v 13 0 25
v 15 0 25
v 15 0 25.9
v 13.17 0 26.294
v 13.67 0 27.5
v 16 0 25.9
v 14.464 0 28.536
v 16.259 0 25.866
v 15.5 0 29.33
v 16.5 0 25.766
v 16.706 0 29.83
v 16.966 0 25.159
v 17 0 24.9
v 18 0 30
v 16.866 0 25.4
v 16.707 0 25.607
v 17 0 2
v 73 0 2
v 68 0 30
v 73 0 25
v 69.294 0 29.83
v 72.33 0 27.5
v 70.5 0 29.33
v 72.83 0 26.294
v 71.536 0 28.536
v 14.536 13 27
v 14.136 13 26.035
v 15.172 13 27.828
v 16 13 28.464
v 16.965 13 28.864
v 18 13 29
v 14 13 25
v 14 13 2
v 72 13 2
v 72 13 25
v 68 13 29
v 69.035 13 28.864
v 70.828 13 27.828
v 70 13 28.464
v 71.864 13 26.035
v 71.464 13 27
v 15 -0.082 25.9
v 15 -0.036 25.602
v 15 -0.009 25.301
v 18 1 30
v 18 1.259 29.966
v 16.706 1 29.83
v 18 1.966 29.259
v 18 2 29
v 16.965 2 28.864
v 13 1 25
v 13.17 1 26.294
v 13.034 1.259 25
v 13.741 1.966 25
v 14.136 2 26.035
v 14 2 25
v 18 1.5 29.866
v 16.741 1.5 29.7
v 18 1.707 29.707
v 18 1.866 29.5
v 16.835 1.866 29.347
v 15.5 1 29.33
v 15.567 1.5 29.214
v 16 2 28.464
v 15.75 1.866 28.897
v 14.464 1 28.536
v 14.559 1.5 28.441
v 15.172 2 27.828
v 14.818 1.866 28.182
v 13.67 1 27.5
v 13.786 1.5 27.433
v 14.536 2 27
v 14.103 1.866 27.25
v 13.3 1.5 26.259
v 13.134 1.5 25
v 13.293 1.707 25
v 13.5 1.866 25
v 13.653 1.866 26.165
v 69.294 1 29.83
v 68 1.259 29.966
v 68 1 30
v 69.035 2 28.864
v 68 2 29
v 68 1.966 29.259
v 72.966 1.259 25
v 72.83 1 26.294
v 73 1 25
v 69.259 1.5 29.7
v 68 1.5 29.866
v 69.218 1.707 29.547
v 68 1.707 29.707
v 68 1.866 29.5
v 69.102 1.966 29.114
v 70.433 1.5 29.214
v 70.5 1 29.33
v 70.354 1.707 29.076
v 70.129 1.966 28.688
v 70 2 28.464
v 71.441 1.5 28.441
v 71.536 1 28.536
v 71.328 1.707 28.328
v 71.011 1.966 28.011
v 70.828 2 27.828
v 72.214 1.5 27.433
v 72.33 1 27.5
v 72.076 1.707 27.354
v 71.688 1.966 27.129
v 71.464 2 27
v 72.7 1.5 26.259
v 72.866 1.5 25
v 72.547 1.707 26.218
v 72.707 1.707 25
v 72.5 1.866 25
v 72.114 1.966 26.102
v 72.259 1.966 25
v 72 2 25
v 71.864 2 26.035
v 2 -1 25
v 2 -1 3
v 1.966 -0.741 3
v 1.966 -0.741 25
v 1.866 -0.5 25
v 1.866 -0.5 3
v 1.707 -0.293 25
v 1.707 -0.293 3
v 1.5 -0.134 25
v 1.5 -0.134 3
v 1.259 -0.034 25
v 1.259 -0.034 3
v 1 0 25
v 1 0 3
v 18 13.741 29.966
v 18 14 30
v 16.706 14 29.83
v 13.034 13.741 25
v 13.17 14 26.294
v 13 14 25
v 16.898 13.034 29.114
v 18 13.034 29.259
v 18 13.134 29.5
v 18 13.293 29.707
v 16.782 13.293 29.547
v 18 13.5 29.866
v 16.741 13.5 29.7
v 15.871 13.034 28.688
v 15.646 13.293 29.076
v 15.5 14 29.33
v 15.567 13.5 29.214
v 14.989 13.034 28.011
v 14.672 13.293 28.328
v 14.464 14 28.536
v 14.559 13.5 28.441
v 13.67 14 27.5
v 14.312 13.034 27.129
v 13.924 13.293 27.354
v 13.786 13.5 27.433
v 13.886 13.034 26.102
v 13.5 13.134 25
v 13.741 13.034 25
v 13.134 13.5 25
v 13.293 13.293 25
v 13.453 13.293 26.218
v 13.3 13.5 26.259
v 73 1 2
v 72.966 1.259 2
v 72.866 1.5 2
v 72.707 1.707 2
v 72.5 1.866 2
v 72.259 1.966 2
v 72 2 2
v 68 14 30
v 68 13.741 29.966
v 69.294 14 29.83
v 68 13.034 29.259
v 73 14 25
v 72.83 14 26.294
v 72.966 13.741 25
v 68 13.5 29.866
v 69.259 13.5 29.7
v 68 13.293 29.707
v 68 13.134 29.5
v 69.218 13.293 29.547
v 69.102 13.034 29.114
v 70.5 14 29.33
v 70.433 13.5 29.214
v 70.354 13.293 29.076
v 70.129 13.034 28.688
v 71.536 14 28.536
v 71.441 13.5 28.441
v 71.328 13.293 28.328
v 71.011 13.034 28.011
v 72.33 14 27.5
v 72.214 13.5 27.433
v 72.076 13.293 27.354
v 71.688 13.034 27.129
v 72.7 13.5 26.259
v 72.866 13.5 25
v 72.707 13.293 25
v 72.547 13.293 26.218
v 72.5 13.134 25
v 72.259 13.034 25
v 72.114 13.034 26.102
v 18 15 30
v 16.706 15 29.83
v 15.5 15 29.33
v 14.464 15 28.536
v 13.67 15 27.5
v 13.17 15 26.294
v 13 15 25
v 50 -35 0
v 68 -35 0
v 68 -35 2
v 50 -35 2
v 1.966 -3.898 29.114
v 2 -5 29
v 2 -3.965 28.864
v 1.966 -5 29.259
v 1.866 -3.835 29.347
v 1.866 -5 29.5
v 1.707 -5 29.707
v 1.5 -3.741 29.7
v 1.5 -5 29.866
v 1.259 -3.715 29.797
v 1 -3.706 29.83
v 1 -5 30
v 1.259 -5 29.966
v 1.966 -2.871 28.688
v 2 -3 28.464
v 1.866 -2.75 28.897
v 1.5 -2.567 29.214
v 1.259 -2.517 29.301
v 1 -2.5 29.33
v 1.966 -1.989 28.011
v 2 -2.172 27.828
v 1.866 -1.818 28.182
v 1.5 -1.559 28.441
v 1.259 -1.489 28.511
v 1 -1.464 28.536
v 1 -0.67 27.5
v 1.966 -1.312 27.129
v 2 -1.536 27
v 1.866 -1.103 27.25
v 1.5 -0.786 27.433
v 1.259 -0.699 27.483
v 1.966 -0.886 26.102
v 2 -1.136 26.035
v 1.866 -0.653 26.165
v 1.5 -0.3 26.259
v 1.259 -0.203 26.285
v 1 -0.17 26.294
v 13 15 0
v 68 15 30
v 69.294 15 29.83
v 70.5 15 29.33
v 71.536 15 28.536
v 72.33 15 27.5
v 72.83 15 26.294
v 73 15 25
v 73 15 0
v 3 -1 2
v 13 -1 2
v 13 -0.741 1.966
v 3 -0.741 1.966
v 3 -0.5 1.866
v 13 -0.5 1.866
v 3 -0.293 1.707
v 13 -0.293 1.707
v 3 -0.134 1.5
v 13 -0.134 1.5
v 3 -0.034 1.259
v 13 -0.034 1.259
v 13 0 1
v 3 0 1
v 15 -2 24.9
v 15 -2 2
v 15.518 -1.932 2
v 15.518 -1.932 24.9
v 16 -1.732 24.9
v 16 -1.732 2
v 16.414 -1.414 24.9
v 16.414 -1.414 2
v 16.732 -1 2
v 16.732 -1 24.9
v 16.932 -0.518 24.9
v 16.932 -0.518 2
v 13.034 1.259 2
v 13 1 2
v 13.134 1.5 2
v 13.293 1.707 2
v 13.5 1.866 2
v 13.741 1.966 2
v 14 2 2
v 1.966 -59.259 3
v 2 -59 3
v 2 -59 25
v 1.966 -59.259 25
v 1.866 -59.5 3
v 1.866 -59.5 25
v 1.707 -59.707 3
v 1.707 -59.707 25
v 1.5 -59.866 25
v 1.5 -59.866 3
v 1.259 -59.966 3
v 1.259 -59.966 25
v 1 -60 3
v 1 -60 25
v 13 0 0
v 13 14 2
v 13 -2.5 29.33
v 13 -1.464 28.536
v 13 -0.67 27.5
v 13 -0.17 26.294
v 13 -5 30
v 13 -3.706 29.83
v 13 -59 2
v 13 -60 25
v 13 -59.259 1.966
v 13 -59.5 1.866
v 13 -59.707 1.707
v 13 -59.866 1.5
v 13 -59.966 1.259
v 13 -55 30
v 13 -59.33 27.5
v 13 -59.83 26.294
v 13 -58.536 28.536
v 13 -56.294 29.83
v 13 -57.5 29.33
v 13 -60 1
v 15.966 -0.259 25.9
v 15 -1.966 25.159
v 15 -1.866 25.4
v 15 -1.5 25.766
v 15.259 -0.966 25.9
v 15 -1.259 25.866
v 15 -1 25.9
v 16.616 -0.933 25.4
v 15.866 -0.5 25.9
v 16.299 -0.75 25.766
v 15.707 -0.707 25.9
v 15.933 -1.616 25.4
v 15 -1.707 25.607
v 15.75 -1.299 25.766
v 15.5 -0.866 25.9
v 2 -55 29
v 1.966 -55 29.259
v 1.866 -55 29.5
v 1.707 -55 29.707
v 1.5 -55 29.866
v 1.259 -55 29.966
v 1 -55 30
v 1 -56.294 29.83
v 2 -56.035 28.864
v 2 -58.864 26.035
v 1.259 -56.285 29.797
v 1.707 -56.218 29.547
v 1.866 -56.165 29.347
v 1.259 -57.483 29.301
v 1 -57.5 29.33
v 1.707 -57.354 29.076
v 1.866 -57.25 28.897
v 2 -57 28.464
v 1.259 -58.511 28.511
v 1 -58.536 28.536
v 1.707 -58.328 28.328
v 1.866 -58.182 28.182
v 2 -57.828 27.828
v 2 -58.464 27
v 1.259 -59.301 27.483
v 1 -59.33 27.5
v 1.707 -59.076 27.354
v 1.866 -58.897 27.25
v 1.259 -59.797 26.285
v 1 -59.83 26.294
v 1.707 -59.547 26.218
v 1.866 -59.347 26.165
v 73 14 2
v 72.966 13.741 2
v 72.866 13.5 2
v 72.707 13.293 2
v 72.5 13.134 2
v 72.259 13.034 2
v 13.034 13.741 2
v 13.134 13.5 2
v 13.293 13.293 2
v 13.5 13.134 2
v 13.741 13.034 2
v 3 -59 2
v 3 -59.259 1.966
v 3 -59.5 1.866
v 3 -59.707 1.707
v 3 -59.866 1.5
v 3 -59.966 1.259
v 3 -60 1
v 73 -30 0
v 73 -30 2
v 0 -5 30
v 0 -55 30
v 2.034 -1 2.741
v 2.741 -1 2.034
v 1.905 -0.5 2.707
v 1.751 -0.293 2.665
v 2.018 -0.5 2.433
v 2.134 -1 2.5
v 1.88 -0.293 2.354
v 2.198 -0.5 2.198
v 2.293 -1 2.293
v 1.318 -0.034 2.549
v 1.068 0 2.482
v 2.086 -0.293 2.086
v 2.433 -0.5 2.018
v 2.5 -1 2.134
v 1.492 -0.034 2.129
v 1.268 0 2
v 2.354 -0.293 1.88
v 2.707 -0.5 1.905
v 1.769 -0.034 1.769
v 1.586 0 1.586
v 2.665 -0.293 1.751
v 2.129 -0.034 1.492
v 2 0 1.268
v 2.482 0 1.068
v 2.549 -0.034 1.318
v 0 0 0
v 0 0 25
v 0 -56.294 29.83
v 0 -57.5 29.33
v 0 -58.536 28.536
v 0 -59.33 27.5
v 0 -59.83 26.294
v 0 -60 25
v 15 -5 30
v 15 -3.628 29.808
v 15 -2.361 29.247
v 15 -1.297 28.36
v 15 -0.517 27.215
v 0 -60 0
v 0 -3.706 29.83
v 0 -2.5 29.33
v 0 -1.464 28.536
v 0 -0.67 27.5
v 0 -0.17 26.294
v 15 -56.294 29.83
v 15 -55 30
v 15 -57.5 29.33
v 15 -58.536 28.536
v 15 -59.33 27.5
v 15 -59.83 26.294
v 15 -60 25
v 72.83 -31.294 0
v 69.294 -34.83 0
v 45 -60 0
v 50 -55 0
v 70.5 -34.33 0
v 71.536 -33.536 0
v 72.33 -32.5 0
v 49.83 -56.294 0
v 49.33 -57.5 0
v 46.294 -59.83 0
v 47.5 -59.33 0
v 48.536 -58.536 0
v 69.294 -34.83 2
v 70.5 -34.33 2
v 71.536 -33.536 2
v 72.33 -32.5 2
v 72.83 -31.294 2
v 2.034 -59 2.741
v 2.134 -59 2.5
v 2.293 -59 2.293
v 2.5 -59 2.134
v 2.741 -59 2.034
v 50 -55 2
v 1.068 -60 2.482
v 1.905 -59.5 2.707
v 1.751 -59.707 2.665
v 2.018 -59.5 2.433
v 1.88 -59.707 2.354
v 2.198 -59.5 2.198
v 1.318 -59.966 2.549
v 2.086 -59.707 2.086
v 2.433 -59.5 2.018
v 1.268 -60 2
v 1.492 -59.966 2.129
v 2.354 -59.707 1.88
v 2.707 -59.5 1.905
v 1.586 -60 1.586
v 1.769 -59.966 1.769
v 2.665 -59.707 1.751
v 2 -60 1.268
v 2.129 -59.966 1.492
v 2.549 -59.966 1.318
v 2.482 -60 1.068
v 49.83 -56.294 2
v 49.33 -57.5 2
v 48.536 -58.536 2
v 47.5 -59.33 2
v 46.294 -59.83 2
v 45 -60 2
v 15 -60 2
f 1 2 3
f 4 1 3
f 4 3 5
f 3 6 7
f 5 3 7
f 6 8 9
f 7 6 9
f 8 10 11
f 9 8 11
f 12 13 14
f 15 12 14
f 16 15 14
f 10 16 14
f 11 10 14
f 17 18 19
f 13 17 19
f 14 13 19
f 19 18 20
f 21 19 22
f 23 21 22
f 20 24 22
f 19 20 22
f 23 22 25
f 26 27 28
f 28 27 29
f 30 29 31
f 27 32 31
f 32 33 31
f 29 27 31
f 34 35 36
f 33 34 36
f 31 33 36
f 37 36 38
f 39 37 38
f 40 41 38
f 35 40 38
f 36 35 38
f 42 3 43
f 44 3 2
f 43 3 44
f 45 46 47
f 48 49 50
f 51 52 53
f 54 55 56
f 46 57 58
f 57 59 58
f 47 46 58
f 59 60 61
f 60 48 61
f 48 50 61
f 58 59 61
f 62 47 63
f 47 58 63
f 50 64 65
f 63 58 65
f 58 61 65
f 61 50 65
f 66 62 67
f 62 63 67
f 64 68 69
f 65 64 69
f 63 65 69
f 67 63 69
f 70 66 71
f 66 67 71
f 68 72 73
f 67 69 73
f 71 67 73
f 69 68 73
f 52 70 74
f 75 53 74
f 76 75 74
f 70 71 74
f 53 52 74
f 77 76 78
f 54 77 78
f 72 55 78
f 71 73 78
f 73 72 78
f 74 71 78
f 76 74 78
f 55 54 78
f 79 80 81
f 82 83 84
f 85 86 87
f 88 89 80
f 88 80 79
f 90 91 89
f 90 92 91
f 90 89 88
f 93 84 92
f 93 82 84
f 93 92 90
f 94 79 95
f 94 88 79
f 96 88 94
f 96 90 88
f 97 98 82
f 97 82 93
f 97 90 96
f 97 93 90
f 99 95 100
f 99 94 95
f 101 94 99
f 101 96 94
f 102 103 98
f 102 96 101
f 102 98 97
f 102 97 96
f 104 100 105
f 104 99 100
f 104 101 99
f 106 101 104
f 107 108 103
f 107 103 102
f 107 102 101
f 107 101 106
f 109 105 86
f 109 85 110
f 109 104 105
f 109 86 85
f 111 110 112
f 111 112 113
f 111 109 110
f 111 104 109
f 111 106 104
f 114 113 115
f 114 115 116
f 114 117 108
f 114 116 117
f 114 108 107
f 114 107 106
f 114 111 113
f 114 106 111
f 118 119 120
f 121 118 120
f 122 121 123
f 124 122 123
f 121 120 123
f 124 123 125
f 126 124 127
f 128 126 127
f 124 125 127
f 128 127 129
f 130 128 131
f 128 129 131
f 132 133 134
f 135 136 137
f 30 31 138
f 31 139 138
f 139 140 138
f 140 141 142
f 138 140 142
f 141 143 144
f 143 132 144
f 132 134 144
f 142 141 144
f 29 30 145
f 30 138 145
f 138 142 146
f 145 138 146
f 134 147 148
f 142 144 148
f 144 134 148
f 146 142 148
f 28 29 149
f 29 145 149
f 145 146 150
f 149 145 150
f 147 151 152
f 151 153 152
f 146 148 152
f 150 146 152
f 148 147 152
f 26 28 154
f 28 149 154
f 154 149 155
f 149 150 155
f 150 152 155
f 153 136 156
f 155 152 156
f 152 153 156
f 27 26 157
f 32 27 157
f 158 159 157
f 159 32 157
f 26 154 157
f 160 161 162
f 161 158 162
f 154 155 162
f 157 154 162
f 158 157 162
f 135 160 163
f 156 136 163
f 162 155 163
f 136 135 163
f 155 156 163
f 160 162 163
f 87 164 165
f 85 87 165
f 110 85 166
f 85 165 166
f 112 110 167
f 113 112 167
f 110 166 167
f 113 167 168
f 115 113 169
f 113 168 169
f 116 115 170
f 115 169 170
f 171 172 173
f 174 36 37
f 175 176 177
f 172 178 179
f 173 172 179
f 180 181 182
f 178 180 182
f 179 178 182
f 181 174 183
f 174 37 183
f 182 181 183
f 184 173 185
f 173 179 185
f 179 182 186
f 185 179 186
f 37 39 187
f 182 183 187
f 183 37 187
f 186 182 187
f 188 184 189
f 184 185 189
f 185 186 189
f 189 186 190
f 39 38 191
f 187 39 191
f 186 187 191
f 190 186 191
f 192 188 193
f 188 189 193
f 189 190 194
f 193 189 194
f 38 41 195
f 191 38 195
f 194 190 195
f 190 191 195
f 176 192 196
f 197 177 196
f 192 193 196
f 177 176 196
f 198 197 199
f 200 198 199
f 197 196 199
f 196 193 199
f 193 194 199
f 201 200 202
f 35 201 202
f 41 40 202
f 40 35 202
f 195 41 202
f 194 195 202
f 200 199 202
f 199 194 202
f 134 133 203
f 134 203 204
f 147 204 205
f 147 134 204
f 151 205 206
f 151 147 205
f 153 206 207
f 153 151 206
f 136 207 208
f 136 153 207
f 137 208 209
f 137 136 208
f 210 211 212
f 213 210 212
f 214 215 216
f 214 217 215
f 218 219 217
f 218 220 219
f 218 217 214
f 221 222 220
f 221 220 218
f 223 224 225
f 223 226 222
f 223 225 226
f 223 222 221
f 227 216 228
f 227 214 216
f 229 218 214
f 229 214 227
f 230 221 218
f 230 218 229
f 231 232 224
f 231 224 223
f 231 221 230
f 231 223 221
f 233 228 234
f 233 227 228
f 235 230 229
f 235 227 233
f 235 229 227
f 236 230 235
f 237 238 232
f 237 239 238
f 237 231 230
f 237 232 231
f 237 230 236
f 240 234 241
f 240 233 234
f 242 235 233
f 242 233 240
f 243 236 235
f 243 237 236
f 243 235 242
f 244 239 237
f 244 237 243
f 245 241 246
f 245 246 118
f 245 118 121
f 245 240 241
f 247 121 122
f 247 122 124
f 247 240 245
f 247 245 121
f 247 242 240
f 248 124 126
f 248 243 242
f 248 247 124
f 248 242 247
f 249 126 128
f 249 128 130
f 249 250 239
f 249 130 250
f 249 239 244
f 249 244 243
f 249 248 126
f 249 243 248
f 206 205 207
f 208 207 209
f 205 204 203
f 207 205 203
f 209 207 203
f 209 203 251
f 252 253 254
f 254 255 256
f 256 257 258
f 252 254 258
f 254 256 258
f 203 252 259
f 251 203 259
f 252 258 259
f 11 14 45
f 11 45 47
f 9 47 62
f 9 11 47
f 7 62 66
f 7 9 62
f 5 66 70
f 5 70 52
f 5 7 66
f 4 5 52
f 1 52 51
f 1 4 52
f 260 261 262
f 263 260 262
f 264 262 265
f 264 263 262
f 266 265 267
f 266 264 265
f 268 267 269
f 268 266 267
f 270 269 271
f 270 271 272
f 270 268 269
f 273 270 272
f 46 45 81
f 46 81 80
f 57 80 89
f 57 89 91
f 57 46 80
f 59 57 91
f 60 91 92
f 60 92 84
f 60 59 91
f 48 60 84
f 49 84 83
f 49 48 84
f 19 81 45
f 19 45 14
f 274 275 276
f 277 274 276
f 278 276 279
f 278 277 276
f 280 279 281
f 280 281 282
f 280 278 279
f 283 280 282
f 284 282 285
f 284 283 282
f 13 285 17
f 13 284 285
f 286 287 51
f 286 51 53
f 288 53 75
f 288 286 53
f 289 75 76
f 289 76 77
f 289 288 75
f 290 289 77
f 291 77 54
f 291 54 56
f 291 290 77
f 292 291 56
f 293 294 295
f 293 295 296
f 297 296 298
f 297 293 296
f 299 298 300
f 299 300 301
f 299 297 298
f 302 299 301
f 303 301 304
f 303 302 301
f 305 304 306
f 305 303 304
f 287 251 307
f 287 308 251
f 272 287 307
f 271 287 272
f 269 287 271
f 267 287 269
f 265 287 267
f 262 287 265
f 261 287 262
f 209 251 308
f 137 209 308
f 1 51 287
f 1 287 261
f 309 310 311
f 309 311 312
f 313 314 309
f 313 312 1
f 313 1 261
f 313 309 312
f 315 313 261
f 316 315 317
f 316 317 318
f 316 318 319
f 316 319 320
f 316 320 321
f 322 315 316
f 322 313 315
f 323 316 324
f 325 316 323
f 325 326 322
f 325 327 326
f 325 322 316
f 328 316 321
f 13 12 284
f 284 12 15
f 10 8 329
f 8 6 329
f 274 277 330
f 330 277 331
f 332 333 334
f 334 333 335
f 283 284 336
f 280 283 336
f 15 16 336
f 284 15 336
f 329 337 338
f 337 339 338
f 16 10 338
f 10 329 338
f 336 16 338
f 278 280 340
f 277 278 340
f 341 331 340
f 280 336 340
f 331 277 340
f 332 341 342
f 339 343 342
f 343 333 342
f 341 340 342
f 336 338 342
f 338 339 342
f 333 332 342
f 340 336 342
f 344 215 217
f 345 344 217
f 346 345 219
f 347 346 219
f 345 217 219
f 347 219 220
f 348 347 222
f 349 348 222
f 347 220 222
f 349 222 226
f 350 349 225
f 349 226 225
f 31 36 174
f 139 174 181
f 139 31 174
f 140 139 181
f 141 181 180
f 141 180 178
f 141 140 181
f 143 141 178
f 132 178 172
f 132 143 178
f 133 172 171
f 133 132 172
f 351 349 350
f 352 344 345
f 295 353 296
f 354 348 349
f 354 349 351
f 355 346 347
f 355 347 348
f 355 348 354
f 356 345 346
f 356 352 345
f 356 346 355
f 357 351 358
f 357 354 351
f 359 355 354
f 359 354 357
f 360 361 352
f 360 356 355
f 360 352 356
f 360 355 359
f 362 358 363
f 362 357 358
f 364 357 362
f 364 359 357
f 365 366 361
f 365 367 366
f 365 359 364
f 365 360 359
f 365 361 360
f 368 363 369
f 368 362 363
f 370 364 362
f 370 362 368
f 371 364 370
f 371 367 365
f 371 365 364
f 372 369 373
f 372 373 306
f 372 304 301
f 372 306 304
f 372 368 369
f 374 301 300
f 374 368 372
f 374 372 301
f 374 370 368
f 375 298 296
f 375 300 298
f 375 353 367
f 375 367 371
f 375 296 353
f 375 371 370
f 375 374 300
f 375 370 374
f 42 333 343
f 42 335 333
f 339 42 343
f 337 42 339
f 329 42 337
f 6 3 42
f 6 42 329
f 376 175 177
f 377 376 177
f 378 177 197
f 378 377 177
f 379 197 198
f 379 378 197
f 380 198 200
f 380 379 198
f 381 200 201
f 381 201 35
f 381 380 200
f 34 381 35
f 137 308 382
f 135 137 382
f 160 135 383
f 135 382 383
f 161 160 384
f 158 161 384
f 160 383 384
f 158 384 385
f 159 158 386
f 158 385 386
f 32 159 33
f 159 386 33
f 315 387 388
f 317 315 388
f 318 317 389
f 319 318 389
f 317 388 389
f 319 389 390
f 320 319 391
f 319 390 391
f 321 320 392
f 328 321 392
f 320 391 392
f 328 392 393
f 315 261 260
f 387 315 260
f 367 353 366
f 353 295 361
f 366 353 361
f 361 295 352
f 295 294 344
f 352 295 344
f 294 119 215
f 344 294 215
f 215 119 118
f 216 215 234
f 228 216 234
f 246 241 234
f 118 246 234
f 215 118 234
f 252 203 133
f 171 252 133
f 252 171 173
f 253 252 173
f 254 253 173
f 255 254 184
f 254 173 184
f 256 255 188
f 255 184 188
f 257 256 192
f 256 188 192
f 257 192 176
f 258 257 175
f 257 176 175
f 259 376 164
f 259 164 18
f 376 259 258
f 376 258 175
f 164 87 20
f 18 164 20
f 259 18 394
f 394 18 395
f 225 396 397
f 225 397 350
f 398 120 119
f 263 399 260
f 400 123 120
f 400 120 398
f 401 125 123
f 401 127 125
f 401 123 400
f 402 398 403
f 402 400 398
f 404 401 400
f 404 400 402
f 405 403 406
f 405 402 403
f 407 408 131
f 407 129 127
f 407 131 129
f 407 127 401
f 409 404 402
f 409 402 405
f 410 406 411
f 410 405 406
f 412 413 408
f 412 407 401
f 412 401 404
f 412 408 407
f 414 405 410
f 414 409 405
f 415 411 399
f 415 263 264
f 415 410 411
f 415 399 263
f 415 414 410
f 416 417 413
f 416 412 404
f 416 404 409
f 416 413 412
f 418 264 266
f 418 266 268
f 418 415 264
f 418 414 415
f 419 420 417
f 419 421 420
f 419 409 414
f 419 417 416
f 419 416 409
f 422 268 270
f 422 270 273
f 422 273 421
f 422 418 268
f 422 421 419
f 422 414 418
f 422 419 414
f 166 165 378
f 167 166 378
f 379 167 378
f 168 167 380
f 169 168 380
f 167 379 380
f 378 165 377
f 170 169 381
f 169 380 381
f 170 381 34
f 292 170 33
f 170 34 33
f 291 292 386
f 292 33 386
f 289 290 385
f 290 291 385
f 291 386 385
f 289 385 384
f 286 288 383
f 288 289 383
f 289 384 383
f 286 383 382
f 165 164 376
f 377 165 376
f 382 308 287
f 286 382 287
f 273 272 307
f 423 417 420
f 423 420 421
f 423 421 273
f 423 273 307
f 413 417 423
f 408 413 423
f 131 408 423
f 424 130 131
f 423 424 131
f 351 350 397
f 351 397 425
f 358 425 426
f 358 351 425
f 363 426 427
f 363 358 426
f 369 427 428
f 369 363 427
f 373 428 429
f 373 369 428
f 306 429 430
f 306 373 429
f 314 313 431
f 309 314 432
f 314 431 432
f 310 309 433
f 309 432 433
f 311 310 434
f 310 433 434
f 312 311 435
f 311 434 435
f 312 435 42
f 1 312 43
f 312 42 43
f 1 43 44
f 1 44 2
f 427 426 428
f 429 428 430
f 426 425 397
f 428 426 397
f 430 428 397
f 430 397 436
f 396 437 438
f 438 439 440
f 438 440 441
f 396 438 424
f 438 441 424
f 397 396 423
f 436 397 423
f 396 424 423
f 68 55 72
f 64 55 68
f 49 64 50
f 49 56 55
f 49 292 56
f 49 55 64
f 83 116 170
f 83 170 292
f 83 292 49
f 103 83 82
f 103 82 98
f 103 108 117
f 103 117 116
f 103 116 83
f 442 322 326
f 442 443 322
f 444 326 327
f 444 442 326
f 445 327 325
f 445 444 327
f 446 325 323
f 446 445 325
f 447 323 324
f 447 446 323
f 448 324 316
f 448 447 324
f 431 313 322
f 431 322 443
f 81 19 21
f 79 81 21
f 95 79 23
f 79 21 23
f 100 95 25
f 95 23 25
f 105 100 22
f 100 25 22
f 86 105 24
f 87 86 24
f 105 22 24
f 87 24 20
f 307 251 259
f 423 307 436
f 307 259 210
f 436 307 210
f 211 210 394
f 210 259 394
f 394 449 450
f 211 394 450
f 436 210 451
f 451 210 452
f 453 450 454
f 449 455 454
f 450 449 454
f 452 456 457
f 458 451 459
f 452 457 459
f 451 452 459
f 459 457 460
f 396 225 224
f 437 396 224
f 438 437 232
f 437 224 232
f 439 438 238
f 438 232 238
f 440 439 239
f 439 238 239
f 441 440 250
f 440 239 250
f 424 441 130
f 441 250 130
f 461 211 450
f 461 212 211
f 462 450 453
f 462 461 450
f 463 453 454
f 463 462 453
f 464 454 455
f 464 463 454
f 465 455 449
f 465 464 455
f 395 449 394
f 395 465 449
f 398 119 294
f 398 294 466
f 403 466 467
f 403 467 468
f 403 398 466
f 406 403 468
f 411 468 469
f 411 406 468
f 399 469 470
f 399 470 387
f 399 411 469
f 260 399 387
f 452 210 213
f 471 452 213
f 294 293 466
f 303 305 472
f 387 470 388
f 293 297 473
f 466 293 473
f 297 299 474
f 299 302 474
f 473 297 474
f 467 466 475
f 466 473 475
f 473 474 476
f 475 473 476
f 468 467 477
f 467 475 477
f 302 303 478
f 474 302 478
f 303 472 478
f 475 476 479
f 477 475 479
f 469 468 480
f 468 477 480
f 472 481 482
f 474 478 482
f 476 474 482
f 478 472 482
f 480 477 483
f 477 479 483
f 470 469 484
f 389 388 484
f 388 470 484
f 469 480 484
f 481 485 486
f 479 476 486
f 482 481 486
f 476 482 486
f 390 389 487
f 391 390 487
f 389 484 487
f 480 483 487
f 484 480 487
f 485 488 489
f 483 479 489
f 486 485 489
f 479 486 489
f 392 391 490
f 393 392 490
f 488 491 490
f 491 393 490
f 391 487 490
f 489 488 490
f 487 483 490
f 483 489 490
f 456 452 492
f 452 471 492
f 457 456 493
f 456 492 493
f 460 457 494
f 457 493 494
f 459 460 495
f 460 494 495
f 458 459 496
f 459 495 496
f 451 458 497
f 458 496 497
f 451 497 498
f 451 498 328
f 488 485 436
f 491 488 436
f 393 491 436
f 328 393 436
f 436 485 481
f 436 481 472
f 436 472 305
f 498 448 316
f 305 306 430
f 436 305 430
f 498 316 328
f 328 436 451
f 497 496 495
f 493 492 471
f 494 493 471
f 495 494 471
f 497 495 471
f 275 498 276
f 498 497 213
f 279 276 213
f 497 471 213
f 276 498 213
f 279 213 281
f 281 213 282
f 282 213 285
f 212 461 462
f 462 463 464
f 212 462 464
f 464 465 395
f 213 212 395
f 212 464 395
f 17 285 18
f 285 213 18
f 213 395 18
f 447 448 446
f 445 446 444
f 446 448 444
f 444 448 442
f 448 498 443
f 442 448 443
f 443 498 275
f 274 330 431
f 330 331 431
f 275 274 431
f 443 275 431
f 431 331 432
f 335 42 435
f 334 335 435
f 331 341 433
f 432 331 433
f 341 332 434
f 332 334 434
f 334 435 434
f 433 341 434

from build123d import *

# Parameters (mm, degrees)
F0_W         = 2
F0_H         = 2
F0_W_2       = 11
F0_H_2       = 28
F0_W_3       = 35
F1_DEPTH     = 60
F2_ANGLE     = -90
F4_R         = 5
F4_2_R       = 5
F6_DEPTH     = 23.9
F7_R         = 1.99999
F8_T1_DEPTH  = 60
F8_T3_DEPTH  = 23
F8_T5_DEPTH  = 1e-05
F8_T7_DEPTH  = 1e-05
F8_T9_DEPTH  = 50
F8_T12_ANGLE = 90
F8_T14_ANGLE = 90
F8_T16_ANGLE = 90
F8_T18_ANGLE = 90
F8_T20_ANGLE = 90
F8_T21_DEPTH = 50
F8_T23_DEPTH = 22
F8_T25_DEPTH = 10
F8_T28_ANGLE = 90
F8_T30_ANGLE = 90
F8_T32_ANGLE = 90
F8_T34_ANGLE = 90


# Not quite as in the source:
# - a fillet or chamfer that OpenCascade refuses, or shapes differently, is made with other operations: its cross-section is extruded or revolved along the edge and cut away or added
# - a fillet or chamfer is up to 0.001 mm smaller than in the source, because OpenCascade refuses the exact size


with BuildPart() as f1:
    # F0 (on Front) → F1 (new body)
    with BuildSketch(Plane.XZ):
        with Locations((1, 1)):
            Rectangle(F0_W, F0_H)
        with Locations((7.5, 1)):
            Rectangle(F0_W_2, F0_H)
        with Locations((1, 16)):
            Rectangle(F0_W, F0_H_2)
        with Locations((14, 1)):
            Rectangle(F0_W, F0_H)
        with Locations((32.5, 1)):
            Rectangle(F0_W_3, F0_H)
        with Locations((14, 16)):
            Rectangle(F0_W, F0_H_2)
    extrude(amount=F1_DEPTH)


with BuildPart() as f2_1:
    # F2: copy of F1
    add(f1.part.rotate(Axis((15, 0, 16), (0, 0, 1)), F2_ANGLE))


with BuildPart() as f2_1_1:
    # F3: moved
    add(f2_1.part.moved(Location((58, 0, 0))))

    # F4#2
    f4_2_edges = [f2_1_1.edges().sort_by_distance(p)[0] for p in [
        (73, 1, 30),
        (73, 14, 30),
        (13, 14, 30),
        (13, 1, 30),
        (73, -35, 1),
    ]]
    fillet(f4_2_edges, radius=F4_2_R)


with BuildPart() as f1_1:
    add(f1.part)

    # F4
    f4_edges = [f1_1.edges().sort_by_distance(p)[0] for p in [
        (14, 0, 30),
        (1, 0, 30),
        (14, -60, 30),
        (1, -60, 30),
        (50, -60, 1),
    ]]
    fillet(f4_edges, radius=F4_R)

    add(f2_1_1.part)  # F6 merges F2_1
    # F5 (on face) → F6 (join)
    with BuildSketch(Plane.XY.offset(2)):
        Polygon((16.8020091951, 0), (15, 0), (15, -2), (17, -2), (17, 0), align=None)
    extrude(amount=F6_DEPTH)

    # F7 (radius 2 in the source; OpenCascade refuses exactly that, so slightly less here)
    f7_edges = [f1_1.edges().sort_by_distance(p)[0] for p in [
        (17, -2, 13.95),
    ]]
    fillet(f7_edges, radius=F7_R)

    # F8: fillet of radius 1 on 19 edges, made by hand

    # F8_s2 → F8_t1 (join)
    with BuildSketch(Plane.XZ):
        with BuildLine():
            ThreePointArc((2, 3), (2.2928932188, 2.2928932188), (3, 2))
            Line((3, 2), (2, 2))
            Line((2, 2), (2, 3))
        make_face()
    extrude(amount=F8_T1_DEPTH)

    # F8_s4 → F8_t3 (cut)
    with BuildSketch(Plane.XY.offset(2)):
        with BuildLine():
            ThreePointArc((13, 1), (13.2928932188, 1.7071067812), (14, 2))
            Line((14, 2), (13, 2))
            Line((13, 2), (13, 1))
        make_face()
        with BuildLine():
            ThreePointArc((73, 14), (72.7071067812, 13.2928932188), (72, 13))
            Line((72, 13), (73, 13))
            Line((73, 13), (73, 14))
        make_face()
        with BuildLine():
            ThreePointArc((73, 1), (72.7071067812, 1.7071067812), (72, 2))
            Line((72, 2), (73, 2))
            Line((73, 2), (73, 1))
        make_face()
        with BuildLine():
            ThreePointArc((13, 14), (13.2928932188, 13.2928932188), (14, 13))
            Line((14, 13), (13, 13))
            Line((13, 13), (13, 14))
        make_face()
    extrude(amount=F8_T3_DEPTH, mode=Mode.SUBTRACT)

    # F8_s6 → F8_t5 (cut)
    with BuildSketch(Plane.YZ.offset(15)):
        with BuildLine():
            ThreePointArc((-2, 24.9), (-1.7071067812, 25.6071067812), (-1, 25.9))
            Line((-1, 25.9), (-2, 25.9))
            Line((-2, 25.9), (-2, 24.9))
        make_face()
    extrude(amount=F8_T5_DEPTH, mode=Mode.SUBTRACT)

    # F8_s8 → F8_t7 (cut)
    with BuildSketch(Plane.XZ):
        with BuildLine():
            ThreePointArc((17, 24.9), (16.7071067812, 25.6071067812), (16, 25.9))
            Line((16, 25.9), (17, 25.9))
            Line((17, 25.9), (17, 24.9))
        make_face()
    extrude(amount=F8_T7_DEPTH, mode=Mode.SUBTRACT)

    # F8_s10 → F8_t9 (cut)
    with BuildSketch(Plane.YZ.offset(18)):
        with BuildLine():
            ThreePointArc((13, 29), (13.2928932188, 29.7071067812), (14, 30))
            Line((14, 30), (13, 30))
            Line((13, 30), (13, 29))
        make_face()
        with BuildLine():
            ThreePointArc((1, 30), (1.7071067812, 29.7071067812), (2, 29))
            Line((2, 29), (2, 30))
            Line((2, 30), (1, 30))
        make_face()
    extrude(amount=F8_T9_DEPTH, mode=Mode.SUBTRACT)

    # F8_s11 → F8_t12 (revolve, cut)
    with BuildSketch(Plane.XZ.offset(1e-05)):
        with BuildLine():
            ThreePointArc((17, 24.9), (16.7071067812, 25.6071067812), (16, 25.9))
            Line((16, 25.9), (17, 25.9))
            Line((17, 25.9), (17, 24.9))
        make_face()
    revolve(axis=Axis((15.00001, -1e-05, 25.9), (0, 0, -1)), revolution_arc=F8_T12_ANGLE, mode=Mode.SUBTRACT)

    # F8_s13 → F8_t14 (revolve, cut)
    with BuildSketch(Plane.YZ.offset(68)):
        with BuildLine():
            ThreePointArc((1, 30), (1.7071067812, 29.7071067812), (2, 29))
            Line((2, 29), (2, 30))
            Line((2, 30), (1, 30))
        make_face()
    revolve(axis=Axis((68, 2, 25), (0, 1, 0)), revolution_arc=F8_T14_ANGLE, mode=Mode.SUBTRACT)

    # F8_s15 → F8_t16 (revolve, cut)
    with BuildSketch(Plane.YZ.offset(18)):
        with BuildLine():
            ThreePointArc((1, 30), (1.7071067812, 29.7071067812), (2, 29))
            Line((2, 29), (2, 30))
            Line((2, 30), (1, 30))
        make_face()
    revolve(axis=Axis((18, 2, 25), (0, -1, 0)), revolution_arc=F8_T16_ANGLE, mode=Mode.SUBTRACT)

    # F8_s17 → F8_t18 (revolve, cut)
    with BuildSketch(Plane.YZ.offset(68)):
        with BuildLine():
            ThreePointArc((14, 30), (13.2928932188, 29.7071067812), (13, 29))
            Line((13, 29), (13, 30))
            Line((13, 30), (14, 30))
        make_face()
    revolve(axis=Axis((68, 13, 25), (0, 1, 0)), revolution_arc=F8_T18_ANGLE, mode=Mode.SUBTRACT)

    # F8_s19 → F8_t20 (revolve, cut)
    with BuildSketch(Plane.YZ.offset(18)):
        with BuildLine():
            ThreePointArc((13, 29), (13.2928932188, 29.7071067812), (14, 30))
            Line((14, 30), (13, 30))
            Line((13, 30), (13, 29))
        make_face()
    revolve(axis=Axis((18, 13, 25), (0, -1, 0)), revolution_arc=F8_T20_ANGLE, mode=Mode.SUBTRACT)

    # F8_s22 → F8_t21 (cut)
    with BuildSketch(Plane.XZ.offset(5)):
        with BuildLine():
            ThreePointArc((2, 29), (1.7071067812, 29.7071067812), (1, 30))
            Line((1, 30), (2, 30))
            Line((2, 30), (2, 29))
        make_face()
    extrude(amount=F8_T21_DEPTH, mode=Mode.SUBTRACT)

    # F8_s24 → F8_t23 (cut)
    with BuildSketch(Plane.XY.offset(3)):
        with BuildLine():
            ThreePointArc((2, -1), (1.7071067812, -0.2928932188), (1, 0))
            Line((1, 0), (2, 0))
            Line((2, 0), (2, -1))
        make_face()
        with BuildLine():
            ThreePointArc((2, -59), (1.7071067812, -59.7071067812), (1, -60))
            Line((1, -60), (2, -60))
            Line((2, -60), (2, -59))
        make_face()
    extrude(amount=F8_T23_DEPTH, mode=Mode.SUBTRACT)

    # F8_s26 → F8_t25 (cut)
    with BuildSketch(Plane.YZ.offset(3)):
        with BuildLine():
            ThreePointArc((-59, 2), (-59.7071067812, 1.7071067812), (-60, 1))
            Line((-60, 1), (-60, 2))
            Line((-60, 2), (-59, 2))
        make_face()
        with BuildLine():
            ThreePointArc((-1, 2), (-0.2928932188, 1.7071067812), (0, 1))
            Line((0, 1), (0, 2))
            Line((0, 2), (-1, 2))
        make_face()
    extrude(amount=F8_T25_DEPTH, mode=Mode.SUBTRACT)

    # F8_s27 → F8_t28 (revolve, cut)
    with BuildSketch(Plane.XZ.offset(5)):
        with BuildLine():
            ThreePointArc((2, 29), (1.7071067812, 29.7071067812), (1, 30))
            Line((1, 30), (2, 30))
            Line((2, 30), (2, 29))
        make_face()
    revolve(axis=Axis((2, -5, 25), (-1, 0, 0)), revolution_arc=F8_T28_ANGLE, mode=Mode.SUBTRACT)

    # F8_s29 → F8_t30 (revolve, cut)
    with BuildSketch(Plane.XZ.offset(55)):
        with BuildLine():
            ThreePointArc((1, 30), (1.7071067812, 29.7071067812), (2, 29))
            Line((2, 29), (2, 30))
            Line((2, 30), (1, 30))
        make_face()
    revolve(axis=Axis((2, -55, 25), (1, 0, 0)), revolution_arc=F8_T30_ANGLE, mode=Mode.SUBTRACT)

    # F8_s31 → F8_t32 (revolve, cut)
    with BuildSketch(Plane.XY.offset(3)):
        with BuildLine():
            ThreePointArc((2, -1), (1.7071067812, -0.2928932188), (1, 0))
            Line((1, 0), (2, 0))
            Line((2, 0), (2, -1))
        make_face()
    revolve(axis=Axis((3, 0, 3), (0, -1, 0)), revolution_arc=F8_T32_ANGLE, mode=Mode.SUBTRACT)

    # F8_s33 → F8_t34 (revolve, cut)
    with BuildSketch(Plane.XY.offset(3)):
        with BuildLine():
            ThreePointArc((2, -59), (1.7071067812, -59.7071067812), (1, -60))
            Line((1, -60), (2, -60))
            Line((2, -60), (2, -59))
        make_face()
    revolve(axis=Axis((3, -60, 3), (0, -1, 0)), revolution_arc=F8_T34_ANGLE, mode=Mode.SUBTRACT)


solid = f1_1.part
